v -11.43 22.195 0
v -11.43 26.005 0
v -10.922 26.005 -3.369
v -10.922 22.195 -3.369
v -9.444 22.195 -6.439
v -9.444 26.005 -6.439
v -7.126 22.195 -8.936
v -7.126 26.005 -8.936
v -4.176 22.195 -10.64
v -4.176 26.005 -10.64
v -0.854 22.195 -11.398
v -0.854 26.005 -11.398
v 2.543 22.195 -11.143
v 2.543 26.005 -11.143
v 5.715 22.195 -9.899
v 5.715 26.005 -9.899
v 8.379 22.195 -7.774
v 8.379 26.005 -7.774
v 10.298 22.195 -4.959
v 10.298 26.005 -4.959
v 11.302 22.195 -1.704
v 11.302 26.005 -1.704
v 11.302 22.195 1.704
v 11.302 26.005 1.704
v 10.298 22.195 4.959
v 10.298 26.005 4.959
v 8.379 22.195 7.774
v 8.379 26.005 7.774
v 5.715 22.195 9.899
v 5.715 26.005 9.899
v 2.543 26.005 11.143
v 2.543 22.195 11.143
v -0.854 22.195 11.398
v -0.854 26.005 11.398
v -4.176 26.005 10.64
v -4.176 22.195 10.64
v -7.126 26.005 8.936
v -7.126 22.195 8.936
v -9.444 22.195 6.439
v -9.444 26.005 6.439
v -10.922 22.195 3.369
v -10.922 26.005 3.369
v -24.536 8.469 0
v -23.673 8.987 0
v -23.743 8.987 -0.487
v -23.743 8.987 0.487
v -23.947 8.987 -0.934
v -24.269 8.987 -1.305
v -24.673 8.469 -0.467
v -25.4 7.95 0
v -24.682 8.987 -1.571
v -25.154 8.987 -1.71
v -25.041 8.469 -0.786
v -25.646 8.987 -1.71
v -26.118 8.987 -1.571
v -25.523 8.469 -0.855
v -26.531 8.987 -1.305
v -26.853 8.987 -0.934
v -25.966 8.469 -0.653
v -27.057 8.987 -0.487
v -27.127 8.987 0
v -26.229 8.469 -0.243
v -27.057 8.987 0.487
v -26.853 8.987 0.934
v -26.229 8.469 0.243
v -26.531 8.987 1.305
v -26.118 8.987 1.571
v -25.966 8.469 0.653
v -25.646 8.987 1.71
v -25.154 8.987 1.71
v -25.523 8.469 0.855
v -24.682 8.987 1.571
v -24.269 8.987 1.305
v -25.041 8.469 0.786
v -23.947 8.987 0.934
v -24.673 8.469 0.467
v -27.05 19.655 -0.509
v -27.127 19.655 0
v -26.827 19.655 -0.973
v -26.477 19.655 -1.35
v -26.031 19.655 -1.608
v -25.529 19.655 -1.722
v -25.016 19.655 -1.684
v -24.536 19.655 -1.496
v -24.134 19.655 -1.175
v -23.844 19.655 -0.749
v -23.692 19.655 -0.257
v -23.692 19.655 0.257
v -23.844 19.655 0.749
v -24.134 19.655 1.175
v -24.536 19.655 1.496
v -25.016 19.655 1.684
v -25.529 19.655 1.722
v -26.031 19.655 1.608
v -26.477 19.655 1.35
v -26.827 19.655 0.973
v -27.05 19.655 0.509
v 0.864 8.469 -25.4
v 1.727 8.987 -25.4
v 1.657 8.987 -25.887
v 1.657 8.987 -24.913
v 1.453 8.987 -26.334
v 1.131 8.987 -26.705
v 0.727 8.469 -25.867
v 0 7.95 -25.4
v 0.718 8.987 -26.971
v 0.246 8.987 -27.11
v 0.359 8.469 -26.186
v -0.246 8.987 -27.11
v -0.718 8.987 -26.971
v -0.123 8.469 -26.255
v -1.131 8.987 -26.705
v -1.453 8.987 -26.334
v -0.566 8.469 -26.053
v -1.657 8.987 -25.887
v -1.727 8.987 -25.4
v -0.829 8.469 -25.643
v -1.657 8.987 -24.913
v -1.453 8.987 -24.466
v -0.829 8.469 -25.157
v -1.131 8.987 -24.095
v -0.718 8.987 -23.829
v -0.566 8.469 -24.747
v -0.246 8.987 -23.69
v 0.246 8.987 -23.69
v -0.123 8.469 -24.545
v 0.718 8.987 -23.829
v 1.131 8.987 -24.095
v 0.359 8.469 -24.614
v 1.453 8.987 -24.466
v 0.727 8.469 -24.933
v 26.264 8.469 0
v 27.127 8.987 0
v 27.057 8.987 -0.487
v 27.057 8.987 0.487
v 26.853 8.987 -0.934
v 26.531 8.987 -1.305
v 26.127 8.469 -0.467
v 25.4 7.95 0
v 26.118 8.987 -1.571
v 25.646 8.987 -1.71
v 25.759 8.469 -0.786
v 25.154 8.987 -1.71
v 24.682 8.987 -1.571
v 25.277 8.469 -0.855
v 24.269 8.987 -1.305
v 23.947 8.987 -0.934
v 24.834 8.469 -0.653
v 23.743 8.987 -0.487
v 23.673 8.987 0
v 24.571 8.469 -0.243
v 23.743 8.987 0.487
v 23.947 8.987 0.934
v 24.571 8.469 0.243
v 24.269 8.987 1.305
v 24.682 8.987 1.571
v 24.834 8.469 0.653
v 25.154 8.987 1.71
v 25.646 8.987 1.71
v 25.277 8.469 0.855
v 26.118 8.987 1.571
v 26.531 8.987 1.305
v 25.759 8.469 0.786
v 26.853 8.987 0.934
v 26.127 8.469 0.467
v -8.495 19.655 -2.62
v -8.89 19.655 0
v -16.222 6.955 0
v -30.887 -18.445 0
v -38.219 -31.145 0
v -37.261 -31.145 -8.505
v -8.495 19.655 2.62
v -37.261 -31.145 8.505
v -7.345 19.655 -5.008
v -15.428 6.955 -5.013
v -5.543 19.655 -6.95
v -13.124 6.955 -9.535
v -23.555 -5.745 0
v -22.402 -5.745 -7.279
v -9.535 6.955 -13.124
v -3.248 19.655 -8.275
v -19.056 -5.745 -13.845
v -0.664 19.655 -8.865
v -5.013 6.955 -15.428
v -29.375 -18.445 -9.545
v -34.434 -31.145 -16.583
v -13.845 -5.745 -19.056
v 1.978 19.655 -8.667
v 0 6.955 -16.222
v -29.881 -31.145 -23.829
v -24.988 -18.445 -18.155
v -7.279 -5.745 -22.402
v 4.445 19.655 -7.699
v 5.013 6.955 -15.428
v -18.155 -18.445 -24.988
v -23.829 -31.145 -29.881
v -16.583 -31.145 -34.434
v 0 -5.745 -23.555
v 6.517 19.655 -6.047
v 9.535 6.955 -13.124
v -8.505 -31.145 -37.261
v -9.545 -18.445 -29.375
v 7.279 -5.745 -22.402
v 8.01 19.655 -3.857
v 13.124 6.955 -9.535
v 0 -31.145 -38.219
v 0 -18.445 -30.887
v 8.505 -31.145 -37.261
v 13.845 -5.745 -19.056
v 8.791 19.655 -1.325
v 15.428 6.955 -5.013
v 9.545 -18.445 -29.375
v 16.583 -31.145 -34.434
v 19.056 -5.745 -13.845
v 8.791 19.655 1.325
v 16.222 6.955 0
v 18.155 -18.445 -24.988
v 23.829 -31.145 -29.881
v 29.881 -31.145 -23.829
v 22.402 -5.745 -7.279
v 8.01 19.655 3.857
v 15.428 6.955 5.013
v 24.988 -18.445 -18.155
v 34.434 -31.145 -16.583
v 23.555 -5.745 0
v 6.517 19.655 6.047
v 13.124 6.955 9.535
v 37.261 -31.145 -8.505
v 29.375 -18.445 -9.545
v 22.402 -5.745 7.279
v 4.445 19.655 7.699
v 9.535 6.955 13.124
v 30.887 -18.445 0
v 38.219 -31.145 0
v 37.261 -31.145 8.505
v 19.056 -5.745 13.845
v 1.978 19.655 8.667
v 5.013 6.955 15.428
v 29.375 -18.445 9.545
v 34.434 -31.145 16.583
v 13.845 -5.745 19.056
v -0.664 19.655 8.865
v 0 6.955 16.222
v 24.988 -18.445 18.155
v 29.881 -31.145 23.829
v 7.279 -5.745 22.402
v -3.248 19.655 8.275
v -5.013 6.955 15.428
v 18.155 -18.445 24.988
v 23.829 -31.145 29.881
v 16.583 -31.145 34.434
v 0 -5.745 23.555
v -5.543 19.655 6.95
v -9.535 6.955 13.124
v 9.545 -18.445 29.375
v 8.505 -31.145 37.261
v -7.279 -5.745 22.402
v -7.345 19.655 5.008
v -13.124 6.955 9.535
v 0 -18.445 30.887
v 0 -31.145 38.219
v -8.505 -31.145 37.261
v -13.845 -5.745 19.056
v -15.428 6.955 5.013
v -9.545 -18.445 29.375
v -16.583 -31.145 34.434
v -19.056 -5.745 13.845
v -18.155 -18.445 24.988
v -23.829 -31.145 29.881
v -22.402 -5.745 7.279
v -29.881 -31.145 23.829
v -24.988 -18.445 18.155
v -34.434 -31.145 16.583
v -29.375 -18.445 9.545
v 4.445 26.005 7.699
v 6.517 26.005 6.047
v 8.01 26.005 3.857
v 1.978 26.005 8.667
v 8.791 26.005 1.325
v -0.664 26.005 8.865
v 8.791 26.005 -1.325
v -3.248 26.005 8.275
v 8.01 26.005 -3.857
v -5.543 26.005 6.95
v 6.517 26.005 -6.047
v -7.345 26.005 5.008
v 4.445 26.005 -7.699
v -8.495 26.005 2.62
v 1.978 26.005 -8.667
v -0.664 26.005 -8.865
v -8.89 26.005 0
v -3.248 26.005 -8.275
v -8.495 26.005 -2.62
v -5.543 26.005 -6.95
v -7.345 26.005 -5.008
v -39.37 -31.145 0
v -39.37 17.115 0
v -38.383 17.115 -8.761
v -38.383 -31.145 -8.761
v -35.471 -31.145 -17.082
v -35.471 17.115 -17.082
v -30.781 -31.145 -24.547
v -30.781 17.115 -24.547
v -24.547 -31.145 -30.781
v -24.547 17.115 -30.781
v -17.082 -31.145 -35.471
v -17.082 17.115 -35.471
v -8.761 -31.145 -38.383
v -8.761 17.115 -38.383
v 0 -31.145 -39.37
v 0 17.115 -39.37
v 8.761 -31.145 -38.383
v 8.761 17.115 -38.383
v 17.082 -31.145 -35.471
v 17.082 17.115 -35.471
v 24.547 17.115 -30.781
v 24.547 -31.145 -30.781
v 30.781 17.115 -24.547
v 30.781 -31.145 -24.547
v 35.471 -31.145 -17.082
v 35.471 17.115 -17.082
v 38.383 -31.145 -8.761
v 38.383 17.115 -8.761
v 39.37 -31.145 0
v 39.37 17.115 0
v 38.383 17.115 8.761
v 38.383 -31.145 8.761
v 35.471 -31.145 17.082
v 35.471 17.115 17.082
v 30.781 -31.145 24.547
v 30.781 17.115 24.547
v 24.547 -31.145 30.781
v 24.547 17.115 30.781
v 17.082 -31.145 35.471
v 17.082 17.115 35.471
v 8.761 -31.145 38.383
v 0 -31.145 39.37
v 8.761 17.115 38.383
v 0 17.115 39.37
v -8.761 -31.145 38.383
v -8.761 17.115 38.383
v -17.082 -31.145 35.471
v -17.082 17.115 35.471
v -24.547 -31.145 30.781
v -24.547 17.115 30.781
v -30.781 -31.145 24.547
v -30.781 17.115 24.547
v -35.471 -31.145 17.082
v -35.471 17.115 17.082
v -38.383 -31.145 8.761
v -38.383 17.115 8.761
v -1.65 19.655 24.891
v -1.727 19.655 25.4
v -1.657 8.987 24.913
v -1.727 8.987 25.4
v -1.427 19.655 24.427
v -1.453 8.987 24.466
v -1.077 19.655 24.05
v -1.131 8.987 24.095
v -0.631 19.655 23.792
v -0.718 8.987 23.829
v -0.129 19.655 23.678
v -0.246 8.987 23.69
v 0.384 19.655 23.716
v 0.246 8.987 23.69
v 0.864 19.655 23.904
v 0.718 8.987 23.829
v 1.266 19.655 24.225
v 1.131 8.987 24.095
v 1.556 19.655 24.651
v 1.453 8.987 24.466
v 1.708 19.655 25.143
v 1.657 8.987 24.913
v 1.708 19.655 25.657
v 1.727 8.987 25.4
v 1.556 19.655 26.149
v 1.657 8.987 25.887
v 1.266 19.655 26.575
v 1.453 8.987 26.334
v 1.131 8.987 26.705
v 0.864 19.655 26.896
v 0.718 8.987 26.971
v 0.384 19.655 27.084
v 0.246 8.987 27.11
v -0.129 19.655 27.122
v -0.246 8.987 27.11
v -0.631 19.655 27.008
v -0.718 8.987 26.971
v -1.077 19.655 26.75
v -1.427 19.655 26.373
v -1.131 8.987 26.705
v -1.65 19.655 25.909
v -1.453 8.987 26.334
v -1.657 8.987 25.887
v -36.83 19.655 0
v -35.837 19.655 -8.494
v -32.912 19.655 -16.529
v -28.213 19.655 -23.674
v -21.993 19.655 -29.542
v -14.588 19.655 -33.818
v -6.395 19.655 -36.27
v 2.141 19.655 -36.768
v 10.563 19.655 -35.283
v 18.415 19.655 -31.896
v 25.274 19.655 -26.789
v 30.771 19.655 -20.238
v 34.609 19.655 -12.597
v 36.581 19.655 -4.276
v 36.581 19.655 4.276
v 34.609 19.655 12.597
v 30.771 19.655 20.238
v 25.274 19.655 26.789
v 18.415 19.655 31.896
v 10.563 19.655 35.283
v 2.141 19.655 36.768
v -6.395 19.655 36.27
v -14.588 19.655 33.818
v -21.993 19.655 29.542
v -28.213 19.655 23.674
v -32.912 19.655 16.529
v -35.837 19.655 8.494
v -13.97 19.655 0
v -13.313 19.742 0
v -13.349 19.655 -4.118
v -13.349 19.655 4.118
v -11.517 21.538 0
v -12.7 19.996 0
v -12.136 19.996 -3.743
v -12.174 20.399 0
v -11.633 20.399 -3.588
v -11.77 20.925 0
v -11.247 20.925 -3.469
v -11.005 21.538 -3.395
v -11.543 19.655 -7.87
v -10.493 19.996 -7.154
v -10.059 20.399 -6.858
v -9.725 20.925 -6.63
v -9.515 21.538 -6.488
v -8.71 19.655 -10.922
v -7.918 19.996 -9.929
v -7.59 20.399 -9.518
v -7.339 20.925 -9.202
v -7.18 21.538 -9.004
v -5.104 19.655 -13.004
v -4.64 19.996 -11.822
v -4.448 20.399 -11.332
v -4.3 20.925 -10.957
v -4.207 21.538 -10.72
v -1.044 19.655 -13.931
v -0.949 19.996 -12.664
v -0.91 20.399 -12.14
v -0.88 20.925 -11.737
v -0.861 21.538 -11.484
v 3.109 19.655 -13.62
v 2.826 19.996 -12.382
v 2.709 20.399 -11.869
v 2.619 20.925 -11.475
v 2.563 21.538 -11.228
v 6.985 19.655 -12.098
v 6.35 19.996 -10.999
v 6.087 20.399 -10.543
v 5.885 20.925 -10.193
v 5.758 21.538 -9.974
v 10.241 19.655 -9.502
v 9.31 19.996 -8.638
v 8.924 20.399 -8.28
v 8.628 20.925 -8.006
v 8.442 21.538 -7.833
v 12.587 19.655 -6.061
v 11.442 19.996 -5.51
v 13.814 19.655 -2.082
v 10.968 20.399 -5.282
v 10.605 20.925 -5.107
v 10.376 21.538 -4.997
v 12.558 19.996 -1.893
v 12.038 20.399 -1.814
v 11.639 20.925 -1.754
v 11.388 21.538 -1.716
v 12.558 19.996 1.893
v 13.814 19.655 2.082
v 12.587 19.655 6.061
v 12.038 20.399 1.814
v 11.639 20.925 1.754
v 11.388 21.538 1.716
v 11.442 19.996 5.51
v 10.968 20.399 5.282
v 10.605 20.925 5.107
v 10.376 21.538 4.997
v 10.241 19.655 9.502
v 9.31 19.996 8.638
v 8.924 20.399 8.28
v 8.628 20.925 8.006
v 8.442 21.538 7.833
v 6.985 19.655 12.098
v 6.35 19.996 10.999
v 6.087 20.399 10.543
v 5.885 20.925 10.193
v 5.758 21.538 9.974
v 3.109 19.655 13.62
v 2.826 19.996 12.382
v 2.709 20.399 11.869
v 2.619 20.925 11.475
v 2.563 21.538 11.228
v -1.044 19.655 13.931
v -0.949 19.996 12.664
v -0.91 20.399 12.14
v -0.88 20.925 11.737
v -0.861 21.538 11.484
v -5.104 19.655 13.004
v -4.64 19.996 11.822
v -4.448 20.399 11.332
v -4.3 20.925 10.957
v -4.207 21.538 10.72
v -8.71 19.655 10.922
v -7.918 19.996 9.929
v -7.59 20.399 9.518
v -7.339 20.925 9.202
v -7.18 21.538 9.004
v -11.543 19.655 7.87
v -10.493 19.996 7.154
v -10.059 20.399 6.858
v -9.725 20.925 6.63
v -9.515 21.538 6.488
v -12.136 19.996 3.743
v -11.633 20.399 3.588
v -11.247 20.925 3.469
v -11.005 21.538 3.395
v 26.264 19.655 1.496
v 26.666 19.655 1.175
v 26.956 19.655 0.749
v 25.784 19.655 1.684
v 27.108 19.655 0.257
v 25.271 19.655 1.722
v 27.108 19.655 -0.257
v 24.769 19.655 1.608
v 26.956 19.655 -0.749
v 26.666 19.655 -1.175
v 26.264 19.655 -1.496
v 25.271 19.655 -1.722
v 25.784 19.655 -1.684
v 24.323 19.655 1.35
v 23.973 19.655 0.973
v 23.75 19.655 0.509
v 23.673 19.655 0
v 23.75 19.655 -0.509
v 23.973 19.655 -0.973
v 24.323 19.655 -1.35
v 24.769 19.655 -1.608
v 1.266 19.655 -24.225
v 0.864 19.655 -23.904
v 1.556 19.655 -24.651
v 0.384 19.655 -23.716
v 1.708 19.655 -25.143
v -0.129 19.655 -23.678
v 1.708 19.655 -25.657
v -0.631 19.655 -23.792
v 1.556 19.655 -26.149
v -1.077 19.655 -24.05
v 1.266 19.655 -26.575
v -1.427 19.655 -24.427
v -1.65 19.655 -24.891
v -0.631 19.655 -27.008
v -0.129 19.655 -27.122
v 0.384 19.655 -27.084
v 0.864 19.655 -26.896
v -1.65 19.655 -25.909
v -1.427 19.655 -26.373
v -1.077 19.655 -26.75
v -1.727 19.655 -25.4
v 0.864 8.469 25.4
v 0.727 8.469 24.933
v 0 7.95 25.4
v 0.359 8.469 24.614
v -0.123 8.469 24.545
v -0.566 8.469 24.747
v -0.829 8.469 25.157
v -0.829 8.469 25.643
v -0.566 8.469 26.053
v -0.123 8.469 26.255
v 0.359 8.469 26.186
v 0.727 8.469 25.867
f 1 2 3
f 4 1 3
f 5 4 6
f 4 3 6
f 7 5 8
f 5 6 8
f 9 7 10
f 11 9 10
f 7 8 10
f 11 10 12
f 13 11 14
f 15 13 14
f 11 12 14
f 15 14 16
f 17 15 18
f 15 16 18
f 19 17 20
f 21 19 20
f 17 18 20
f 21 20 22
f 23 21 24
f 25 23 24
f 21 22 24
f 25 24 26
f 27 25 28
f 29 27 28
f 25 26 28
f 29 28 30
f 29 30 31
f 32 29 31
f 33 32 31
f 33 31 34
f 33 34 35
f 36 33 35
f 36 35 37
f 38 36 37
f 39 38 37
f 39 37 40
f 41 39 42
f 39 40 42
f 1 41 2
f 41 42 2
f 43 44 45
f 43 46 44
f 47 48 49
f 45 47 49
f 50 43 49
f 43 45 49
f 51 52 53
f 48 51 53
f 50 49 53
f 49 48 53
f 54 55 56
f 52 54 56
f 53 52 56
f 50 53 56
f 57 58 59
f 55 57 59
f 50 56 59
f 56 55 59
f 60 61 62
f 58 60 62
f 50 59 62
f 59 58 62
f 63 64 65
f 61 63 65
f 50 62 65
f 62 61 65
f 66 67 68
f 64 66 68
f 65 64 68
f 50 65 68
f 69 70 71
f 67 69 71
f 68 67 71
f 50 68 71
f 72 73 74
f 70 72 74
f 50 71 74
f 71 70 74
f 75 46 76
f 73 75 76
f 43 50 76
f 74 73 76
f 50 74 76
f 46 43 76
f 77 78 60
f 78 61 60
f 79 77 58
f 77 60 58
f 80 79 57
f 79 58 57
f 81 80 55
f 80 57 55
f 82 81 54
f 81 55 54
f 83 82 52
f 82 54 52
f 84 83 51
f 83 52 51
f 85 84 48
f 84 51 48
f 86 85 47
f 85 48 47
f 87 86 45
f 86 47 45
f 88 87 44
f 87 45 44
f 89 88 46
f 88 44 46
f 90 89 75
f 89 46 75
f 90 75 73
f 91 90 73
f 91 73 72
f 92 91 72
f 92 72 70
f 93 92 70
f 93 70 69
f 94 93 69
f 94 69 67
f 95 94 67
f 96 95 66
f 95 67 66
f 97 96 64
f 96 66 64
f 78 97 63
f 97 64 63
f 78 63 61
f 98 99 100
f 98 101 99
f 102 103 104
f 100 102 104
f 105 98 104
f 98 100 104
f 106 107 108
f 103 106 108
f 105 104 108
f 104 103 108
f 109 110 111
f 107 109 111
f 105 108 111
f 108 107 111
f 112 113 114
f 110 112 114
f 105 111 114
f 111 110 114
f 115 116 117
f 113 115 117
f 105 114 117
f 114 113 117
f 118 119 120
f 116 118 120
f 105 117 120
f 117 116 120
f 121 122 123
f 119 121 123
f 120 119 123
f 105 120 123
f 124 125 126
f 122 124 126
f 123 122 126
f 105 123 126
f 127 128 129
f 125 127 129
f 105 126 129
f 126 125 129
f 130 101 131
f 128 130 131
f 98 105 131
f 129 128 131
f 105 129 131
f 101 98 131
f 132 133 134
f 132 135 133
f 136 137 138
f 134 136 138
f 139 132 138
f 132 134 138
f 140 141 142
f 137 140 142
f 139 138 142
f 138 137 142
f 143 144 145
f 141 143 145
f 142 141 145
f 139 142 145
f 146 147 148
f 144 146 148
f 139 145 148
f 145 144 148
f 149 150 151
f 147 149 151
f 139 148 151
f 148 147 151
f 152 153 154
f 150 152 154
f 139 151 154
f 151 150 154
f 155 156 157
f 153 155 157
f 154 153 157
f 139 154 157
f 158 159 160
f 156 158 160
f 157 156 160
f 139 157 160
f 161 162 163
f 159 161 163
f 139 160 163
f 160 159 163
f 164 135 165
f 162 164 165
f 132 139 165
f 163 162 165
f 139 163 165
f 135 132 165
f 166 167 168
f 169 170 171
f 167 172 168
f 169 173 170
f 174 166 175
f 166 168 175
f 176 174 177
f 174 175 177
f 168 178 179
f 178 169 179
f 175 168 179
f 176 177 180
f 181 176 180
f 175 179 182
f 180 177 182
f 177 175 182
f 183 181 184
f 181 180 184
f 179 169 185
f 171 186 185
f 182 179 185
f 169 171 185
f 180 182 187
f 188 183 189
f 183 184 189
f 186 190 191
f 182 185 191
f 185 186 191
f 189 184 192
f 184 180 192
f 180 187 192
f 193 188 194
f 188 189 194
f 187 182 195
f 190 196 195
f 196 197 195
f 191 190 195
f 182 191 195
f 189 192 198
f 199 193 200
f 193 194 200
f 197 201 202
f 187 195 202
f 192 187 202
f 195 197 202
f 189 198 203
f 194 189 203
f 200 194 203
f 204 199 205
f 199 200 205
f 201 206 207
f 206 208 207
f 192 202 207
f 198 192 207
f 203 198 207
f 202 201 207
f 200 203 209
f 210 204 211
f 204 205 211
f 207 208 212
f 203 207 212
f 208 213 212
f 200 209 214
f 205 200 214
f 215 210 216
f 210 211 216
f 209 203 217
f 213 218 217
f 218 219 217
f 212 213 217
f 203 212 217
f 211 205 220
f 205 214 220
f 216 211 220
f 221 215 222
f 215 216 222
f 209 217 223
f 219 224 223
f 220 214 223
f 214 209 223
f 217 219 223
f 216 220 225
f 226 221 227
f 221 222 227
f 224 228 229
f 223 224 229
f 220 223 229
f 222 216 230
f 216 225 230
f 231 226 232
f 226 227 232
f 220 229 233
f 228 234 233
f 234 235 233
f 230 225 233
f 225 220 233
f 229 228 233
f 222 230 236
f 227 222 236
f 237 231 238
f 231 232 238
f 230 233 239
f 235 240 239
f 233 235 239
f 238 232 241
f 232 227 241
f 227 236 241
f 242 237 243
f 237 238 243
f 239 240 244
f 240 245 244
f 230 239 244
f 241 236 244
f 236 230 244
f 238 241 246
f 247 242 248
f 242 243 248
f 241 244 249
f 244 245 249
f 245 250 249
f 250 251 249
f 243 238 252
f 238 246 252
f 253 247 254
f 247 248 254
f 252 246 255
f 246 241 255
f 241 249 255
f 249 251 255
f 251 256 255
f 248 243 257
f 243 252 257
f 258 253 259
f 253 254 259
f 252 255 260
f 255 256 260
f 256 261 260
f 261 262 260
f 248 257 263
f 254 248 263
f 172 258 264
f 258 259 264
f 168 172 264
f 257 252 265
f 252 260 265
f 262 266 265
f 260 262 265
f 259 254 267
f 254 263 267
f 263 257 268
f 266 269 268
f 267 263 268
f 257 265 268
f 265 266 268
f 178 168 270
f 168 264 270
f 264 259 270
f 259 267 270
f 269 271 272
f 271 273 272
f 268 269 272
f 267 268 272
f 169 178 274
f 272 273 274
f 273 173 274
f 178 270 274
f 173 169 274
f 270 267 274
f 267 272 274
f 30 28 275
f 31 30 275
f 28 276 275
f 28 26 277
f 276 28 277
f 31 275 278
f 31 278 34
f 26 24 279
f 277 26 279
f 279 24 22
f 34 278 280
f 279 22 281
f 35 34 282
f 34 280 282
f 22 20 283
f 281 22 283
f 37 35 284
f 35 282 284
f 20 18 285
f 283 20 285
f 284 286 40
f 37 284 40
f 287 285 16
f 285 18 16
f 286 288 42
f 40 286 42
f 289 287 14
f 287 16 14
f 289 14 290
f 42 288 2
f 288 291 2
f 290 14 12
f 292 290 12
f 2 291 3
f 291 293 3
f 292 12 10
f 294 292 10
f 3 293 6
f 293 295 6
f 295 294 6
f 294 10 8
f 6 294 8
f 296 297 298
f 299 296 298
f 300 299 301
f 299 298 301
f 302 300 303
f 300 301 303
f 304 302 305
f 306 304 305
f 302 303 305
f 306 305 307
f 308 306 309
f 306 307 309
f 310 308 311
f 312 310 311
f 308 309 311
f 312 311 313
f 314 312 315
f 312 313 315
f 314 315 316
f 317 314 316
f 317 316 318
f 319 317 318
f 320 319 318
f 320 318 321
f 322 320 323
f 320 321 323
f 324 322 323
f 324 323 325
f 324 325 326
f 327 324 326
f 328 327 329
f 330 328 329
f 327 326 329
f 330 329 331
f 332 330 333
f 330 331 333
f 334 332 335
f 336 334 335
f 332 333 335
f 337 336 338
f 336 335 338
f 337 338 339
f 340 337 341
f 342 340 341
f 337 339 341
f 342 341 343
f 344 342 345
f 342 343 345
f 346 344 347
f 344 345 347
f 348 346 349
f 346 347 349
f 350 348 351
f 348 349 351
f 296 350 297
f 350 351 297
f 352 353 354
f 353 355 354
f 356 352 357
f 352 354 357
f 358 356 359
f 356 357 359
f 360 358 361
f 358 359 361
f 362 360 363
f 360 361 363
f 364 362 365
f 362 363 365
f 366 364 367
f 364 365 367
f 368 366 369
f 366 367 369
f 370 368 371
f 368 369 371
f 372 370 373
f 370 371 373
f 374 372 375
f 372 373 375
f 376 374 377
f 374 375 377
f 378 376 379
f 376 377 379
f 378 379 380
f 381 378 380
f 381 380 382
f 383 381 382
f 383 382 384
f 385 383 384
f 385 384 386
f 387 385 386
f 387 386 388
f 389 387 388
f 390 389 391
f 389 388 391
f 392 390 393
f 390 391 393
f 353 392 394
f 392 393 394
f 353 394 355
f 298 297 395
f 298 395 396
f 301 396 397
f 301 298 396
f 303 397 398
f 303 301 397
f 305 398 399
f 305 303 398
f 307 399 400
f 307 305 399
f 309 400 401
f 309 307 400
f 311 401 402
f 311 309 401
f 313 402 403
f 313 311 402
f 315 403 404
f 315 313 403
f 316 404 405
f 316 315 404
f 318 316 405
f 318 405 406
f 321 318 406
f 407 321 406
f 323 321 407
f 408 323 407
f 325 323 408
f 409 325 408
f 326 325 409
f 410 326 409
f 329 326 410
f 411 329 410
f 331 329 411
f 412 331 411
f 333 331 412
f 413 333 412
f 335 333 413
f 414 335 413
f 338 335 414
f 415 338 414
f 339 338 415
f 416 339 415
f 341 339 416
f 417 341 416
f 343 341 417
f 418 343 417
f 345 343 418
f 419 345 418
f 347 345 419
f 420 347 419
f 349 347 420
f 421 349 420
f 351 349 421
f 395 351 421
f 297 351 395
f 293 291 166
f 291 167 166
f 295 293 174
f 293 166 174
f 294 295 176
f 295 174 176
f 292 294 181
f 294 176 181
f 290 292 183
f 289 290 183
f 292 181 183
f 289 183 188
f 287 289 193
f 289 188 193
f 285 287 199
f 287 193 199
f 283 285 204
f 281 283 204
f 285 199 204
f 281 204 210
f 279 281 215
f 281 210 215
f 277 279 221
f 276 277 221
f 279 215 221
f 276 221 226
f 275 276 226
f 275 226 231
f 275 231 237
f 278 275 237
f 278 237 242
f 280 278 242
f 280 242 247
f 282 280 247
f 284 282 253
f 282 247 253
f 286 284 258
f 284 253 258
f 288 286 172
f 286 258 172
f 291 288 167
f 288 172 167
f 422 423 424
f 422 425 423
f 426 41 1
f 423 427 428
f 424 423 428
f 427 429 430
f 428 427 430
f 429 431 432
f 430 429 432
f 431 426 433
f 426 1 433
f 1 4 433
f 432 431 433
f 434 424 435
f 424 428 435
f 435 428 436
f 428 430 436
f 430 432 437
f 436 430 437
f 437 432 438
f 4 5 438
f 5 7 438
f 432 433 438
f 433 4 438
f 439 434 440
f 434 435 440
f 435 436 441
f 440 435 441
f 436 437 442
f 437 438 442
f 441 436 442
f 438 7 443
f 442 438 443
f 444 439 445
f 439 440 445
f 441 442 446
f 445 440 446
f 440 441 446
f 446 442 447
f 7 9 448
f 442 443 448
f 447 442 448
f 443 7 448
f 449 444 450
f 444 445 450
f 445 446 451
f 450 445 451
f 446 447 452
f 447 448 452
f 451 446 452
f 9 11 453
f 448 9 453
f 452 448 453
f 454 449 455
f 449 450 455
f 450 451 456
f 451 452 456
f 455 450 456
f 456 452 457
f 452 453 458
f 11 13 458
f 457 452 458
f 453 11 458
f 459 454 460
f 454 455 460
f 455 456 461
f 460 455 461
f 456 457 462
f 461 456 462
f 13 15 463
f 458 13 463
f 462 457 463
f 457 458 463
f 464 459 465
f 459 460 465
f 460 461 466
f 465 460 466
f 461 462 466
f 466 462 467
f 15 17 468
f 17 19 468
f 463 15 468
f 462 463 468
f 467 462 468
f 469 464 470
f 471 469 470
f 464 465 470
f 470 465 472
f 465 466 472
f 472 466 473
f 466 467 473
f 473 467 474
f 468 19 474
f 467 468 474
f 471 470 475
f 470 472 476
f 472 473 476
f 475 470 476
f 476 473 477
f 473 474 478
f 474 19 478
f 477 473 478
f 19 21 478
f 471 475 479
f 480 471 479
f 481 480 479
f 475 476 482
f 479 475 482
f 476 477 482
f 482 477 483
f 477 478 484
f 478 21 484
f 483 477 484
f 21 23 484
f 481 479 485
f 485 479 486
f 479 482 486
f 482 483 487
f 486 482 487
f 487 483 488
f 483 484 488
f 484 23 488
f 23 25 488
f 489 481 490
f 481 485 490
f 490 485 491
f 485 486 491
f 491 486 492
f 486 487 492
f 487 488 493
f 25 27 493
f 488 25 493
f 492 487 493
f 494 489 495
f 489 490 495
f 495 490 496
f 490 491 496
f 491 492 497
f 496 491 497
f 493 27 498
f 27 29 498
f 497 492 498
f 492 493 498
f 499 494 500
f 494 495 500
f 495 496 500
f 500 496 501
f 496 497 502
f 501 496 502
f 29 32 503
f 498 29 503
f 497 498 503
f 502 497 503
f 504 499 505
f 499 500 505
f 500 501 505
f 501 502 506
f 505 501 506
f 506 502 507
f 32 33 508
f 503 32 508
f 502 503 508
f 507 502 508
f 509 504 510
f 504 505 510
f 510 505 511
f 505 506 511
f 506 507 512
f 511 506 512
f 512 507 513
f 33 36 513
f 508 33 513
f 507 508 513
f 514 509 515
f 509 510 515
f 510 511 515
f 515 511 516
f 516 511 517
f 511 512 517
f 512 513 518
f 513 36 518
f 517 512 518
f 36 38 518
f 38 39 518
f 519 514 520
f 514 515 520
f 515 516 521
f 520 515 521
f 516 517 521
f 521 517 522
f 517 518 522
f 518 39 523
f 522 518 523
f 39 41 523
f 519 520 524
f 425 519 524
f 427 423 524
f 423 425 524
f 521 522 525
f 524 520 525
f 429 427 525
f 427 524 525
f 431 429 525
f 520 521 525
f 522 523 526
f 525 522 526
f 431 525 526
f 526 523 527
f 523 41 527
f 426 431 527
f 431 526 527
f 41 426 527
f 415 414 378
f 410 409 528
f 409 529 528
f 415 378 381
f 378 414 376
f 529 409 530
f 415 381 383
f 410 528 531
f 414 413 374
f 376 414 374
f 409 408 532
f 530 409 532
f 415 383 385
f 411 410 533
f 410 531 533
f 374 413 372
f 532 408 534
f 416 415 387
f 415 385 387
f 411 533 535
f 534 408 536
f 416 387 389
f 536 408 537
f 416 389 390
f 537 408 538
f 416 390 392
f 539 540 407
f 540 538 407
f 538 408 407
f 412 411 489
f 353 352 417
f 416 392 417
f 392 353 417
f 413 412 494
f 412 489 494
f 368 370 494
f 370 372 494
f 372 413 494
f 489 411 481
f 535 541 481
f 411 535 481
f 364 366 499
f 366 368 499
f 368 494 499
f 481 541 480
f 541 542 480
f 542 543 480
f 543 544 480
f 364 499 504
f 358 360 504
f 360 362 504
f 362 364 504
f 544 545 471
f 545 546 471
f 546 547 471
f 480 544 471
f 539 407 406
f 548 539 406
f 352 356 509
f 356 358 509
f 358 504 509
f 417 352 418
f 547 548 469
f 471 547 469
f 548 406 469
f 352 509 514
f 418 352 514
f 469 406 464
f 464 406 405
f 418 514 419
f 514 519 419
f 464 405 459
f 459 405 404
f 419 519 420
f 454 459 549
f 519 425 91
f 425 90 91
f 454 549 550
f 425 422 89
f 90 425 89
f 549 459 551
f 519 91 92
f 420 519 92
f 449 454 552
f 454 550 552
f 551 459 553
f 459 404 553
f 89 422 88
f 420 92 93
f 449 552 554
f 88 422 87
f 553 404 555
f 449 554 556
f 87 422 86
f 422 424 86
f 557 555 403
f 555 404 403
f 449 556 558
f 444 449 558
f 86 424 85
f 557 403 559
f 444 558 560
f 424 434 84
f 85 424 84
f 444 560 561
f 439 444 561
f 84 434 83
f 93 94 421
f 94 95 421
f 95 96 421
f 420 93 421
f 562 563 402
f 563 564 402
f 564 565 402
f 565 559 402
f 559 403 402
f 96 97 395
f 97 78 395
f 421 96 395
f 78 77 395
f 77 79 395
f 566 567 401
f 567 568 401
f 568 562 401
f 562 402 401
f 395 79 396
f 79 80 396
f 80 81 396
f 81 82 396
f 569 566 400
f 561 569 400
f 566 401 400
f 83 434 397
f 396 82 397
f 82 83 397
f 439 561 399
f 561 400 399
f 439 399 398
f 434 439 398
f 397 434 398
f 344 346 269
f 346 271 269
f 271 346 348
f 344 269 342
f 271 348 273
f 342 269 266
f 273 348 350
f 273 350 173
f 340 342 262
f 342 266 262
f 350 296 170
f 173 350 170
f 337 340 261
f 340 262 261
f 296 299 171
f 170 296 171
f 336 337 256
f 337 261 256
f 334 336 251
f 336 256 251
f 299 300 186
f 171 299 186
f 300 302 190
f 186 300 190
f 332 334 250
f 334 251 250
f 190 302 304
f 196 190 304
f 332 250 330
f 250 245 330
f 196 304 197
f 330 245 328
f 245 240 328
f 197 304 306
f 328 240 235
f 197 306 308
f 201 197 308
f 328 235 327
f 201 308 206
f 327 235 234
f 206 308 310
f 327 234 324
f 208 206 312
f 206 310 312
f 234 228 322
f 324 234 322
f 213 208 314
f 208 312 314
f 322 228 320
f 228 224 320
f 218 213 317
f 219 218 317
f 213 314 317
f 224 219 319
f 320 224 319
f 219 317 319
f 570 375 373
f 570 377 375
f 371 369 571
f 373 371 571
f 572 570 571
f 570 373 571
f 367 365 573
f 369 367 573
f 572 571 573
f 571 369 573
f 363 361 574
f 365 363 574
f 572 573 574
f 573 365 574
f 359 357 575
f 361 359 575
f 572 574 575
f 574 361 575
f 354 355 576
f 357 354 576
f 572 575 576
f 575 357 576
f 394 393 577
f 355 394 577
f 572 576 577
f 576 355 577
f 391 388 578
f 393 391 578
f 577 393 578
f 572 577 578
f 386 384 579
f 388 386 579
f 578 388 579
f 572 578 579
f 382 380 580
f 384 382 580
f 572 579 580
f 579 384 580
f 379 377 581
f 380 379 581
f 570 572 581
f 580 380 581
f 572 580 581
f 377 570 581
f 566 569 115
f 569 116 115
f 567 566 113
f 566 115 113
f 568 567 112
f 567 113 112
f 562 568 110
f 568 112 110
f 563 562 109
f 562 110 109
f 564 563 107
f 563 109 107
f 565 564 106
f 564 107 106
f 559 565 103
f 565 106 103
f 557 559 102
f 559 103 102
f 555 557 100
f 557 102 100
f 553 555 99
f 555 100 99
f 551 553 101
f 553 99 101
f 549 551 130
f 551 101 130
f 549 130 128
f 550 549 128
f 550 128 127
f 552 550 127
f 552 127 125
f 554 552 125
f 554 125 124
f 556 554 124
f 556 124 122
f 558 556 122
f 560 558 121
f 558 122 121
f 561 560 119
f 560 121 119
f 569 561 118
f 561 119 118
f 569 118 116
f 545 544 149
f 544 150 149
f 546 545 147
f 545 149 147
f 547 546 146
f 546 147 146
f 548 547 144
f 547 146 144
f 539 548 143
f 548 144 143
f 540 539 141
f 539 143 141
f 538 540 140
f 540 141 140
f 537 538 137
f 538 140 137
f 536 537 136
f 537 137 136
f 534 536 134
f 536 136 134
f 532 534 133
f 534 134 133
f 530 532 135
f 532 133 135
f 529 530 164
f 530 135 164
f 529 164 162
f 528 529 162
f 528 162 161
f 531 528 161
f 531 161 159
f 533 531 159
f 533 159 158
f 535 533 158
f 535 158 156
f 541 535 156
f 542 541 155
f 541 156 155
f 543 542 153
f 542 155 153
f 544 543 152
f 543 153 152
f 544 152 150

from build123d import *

# Parameters (mm, degrees)
FILLET1_R                 = 2.54
CHAMFER1_SIZE             = 2.54
F_8_32_TAPPED_HOLE1_D     = 3.4544
F_8_32_TAPPED_HOLE1_DEPTH = 10.668
F_8_32_TAPPED_HOLE1_TIP   = 1.037806461


with BuildPart() as part:
    # Sketch1 → Revolve1 (revolve)
    with BuildSketch(Plane.XY):
        Polygon((-8.89, 26.005455731), (-8.89, 19.655455731), (-38.219393675, -31.144544269), (-39.37, -31.144544269), (-39.37, 19.655455731), (-11.43, 19.655455731), (-11.43, 26.005455731), align=None)
    revolve(axis=Axis((0, 33.494633817, 0), (0, -1, 0)))

    # Fillet1
    fillet1_edges = [part.edges().sort_by_distance(p)[0] for p in [
        (11.43, 19.655455731, 0),
    ]]
    fillet(fillet1_edges, radius=FILLET1_R)

    # Chamfer1
    chamfer1_edges = [part.edges().sort_by_distance(p)[0] for p in [
        (39.37, 19.655455731, 0),
    ]]
    chamfer(chamfer1_edges, length=CHAMFER1_SIZE)

    # #8-32 Tapped Hole1
    with Locations(Plane(origin=(0, 19.655455731, 0), x_dir=(1, 0, 0), z_dir=(0, 1, 0))):
        with Locations((0, -25.4), (25.4, 0), (0, 25.4), (-25.4, 0)):
            Hole(F_8_32_TAPPED_HOLE1_D / 2, depth=F_8_32_TAPPED_HOLE1_DEPTH)
            with Locations((0, 0, -(F_8_32_TAPPED_HOLE1_DEPTH + F_8_32_TAPPED_HOLE1_TIP / 2))):  # 118° drill point
                Cone(0, F_8_32_TAPPED_HOLE1_D / 2, F_8_32_TAPPED_HOLE1_TIP, mode=Mode.SUBTRACT)


solid = part.part
